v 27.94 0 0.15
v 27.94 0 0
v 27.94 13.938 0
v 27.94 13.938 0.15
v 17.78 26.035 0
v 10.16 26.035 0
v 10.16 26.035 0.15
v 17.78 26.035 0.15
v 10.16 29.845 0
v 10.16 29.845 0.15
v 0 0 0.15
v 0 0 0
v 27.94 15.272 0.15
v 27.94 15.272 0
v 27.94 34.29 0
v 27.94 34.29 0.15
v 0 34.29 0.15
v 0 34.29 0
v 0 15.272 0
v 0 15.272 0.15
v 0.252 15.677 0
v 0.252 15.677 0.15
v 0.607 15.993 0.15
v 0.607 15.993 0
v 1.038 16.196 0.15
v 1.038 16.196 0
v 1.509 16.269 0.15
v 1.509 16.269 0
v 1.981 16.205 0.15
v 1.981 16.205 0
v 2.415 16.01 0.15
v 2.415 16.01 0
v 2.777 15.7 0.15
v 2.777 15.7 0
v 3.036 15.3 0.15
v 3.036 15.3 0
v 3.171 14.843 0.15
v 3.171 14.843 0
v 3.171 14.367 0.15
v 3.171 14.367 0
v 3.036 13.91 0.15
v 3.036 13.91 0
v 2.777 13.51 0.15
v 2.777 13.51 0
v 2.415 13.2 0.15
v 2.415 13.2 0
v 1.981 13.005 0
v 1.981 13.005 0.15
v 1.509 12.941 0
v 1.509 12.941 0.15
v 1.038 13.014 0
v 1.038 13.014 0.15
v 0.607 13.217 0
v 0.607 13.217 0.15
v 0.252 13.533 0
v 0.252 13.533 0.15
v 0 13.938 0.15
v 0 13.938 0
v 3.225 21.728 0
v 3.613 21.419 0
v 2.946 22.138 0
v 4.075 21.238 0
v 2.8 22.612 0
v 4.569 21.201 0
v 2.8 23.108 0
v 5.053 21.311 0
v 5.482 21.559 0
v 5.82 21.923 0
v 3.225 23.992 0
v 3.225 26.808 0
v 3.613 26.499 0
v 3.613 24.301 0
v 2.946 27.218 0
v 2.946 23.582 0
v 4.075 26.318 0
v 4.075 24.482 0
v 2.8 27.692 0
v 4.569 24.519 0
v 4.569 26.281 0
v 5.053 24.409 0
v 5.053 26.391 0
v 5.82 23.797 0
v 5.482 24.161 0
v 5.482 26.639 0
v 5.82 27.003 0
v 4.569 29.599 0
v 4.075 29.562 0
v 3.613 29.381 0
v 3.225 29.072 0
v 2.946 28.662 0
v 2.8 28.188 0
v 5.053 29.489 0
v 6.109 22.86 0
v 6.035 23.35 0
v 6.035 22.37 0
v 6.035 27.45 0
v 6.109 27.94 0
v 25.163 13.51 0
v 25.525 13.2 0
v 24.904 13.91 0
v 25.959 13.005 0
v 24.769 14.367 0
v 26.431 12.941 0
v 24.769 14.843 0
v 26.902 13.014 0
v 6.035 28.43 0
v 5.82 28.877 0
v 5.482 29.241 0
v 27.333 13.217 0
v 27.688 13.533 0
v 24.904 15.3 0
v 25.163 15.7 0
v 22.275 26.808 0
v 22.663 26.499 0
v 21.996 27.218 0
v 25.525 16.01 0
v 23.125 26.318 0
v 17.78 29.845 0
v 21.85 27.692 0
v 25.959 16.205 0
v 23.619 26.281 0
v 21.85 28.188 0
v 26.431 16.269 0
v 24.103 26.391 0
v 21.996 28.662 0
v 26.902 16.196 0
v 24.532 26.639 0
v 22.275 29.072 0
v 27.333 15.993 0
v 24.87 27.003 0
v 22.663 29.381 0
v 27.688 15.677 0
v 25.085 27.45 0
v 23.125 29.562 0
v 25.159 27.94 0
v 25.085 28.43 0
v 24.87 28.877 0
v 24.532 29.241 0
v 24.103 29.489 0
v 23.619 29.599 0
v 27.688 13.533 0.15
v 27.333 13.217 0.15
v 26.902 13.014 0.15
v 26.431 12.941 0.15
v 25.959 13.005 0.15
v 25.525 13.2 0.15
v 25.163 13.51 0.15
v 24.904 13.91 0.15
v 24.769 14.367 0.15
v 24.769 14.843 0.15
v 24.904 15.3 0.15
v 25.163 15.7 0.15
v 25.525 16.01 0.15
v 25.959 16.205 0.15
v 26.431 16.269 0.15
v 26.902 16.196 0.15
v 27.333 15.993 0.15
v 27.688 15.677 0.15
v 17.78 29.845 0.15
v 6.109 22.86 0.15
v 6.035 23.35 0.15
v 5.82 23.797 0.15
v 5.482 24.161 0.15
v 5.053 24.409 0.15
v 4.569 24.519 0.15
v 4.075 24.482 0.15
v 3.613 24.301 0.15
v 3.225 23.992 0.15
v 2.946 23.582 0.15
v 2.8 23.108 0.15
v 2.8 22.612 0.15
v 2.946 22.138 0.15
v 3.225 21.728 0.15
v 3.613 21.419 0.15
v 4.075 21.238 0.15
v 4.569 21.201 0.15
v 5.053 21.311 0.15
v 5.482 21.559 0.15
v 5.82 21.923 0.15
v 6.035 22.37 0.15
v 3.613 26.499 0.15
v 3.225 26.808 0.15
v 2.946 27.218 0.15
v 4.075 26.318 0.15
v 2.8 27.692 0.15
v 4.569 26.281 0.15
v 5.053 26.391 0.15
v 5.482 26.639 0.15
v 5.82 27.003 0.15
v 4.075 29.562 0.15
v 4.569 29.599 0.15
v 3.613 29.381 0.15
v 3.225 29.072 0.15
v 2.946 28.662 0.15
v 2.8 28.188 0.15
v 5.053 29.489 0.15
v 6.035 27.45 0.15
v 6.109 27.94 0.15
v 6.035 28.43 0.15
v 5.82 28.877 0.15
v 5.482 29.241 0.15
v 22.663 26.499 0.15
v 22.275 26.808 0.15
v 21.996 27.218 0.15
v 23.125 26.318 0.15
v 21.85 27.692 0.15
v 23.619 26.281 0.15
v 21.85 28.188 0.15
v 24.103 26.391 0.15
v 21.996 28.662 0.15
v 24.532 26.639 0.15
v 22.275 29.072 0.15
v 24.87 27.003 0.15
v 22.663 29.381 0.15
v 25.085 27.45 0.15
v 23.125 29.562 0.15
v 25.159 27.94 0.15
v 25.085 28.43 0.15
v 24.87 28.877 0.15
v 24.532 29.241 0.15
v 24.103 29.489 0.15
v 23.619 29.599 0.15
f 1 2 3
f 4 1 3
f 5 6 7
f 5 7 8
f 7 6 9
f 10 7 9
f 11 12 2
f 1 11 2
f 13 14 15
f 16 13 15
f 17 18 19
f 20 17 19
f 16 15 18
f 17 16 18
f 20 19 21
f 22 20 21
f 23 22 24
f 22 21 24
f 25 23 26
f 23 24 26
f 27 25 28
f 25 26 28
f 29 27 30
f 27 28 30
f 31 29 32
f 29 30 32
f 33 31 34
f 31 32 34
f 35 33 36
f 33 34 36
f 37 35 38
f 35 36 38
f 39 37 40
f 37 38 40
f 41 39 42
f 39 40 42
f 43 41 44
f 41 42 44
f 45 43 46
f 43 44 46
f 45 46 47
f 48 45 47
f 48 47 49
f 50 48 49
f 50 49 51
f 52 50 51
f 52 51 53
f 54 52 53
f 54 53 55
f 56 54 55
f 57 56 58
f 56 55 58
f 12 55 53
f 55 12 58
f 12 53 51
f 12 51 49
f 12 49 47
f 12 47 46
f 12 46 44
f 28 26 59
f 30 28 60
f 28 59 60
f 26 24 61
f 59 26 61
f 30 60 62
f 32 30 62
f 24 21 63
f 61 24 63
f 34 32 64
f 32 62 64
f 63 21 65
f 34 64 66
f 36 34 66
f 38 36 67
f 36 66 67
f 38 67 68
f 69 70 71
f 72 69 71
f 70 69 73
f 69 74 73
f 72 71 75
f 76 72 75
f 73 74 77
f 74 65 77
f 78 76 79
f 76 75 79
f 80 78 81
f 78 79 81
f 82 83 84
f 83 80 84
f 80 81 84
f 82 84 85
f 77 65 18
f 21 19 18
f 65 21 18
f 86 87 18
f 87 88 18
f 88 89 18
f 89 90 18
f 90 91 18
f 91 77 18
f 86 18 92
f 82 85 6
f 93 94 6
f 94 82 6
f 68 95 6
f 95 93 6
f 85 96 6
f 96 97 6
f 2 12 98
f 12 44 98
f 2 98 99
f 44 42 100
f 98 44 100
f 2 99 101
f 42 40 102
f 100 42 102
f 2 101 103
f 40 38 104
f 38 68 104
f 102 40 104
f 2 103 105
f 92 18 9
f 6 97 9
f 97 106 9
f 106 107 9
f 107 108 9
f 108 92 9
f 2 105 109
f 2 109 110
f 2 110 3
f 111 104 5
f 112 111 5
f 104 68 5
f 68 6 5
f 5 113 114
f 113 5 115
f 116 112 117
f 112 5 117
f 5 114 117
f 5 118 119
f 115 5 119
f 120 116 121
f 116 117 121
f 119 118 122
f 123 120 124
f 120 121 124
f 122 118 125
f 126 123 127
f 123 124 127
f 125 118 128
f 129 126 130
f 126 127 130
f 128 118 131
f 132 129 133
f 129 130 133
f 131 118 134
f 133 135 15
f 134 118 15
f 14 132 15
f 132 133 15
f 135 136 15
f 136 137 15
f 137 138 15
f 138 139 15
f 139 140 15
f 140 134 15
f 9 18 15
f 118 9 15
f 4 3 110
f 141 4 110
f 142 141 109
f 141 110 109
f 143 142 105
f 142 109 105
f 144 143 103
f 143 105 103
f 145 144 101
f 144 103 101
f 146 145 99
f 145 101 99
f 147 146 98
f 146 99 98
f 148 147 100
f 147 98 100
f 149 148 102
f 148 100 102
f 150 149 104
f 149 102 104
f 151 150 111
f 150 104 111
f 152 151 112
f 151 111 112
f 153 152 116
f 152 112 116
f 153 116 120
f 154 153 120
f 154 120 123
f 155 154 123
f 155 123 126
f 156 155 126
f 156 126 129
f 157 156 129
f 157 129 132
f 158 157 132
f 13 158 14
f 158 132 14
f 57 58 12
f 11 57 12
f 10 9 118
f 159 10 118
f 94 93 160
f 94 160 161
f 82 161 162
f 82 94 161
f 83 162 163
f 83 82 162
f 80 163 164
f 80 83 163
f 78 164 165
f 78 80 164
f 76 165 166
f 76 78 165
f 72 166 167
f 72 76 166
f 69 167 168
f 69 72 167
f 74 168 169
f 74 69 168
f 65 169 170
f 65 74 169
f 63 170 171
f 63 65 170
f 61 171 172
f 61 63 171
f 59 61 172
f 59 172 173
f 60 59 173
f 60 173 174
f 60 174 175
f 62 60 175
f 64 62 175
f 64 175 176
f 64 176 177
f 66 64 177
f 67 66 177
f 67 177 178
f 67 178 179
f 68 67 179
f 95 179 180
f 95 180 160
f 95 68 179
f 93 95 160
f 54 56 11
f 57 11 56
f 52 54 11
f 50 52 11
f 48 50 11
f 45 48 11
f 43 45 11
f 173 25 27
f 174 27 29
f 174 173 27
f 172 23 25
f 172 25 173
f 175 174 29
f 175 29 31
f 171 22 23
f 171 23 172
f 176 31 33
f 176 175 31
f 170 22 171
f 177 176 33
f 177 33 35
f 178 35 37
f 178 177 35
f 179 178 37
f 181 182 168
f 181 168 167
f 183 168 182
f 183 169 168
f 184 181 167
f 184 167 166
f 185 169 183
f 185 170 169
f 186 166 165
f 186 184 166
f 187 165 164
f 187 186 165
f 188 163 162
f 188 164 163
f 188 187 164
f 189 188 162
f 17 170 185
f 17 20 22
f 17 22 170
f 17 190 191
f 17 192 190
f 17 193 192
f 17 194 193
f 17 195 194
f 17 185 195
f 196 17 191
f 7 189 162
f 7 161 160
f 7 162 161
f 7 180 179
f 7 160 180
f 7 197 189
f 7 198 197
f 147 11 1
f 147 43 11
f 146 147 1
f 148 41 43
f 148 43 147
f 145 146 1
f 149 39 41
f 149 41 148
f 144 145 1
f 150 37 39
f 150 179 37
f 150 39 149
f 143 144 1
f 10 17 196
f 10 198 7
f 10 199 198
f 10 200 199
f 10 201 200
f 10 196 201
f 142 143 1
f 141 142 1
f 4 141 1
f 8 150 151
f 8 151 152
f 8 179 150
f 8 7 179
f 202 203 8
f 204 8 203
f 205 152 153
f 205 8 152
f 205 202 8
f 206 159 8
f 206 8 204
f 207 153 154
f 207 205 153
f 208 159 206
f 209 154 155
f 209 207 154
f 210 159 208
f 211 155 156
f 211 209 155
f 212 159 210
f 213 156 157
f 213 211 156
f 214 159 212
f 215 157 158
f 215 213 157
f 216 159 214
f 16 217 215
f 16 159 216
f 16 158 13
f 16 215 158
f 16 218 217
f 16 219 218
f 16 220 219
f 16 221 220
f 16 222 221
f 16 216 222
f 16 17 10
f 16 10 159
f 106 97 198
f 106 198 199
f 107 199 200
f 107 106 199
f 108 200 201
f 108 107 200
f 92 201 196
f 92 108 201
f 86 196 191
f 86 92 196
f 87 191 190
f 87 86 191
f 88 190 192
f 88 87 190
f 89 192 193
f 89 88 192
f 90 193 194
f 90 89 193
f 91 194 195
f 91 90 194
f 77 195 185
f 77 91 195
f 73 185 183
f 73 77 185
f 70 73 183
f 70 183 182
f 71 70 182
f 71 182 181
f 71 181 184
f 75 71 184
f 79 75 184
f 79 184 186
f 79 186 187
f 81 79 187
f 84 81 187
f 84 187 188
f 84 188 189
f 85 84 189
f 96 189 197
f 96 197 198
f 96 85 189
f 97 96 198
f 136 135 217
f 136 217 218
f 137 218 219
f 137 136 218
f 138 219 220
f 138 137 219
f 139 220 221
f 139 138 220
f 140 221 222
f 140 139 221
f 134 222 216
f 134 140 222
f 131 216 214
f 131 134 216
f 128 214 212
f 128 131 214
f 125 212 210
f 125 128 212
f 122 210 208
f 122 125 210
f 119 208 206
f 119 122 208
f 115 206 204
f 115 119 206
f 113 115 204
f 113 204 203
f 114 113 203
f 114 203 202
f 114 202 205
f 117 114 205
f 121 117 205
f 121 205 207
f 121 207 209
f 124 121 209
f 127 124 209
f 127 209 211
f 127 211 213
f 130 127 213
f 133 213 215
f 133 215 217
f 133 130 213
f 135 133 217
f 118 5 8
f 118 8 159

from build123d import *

# Parameters (mm, degrees)
SKETCH2_R           = 1.6637
SKETCH2_W           = 7.62
SKETCH2_H           = 3.81
BOSS_EXTRUDE1_DEPTH = 0.15


with BuildPart() as part:
    # Sketch2 → Boss-Extrude1 (new body)
    with BuildSketch(Plane.XY):
        with BuildLine():
            Line((0, 0), (27.94, 0))
            Line((27.94, 0), (27.94, 13.937675724))
            ThreePointArc((27.94, 13.937675724), (24.7523, 14.605), (27.94, 15.272324276))
            Line((27.94, 15.272324276), (27.94, 34.29))
            Line((27.94, 34.29), (0, 34.29))
            Line((0, 34.29), (0, 15.272324276))
            ThreePointArc((0, 15.272324276), (3.1877, 14.605), (0, 13.937675724))
            Line((0, 13.937675724), (0, 0))
        make_face()
        with Locations((4.445, 22.86)):
            Circle(SKETCH2_R, mode=Mode.SUBTRACT)
        with Locations((4.445, 27.94)):
            Circle(SKETCH2_R, mode=Mode.SUBTRACT)
        with Locations((23.495, 27.94)):
            Circle(SKETCH2_R, mode=Mode.SUBTRACT)
        with Locations((13.97, 27.94)):
            Rectangle(SKETCH2_W, SKETCH2_H, mode=Mode.SUBTRACT)
    extrude(amount=BOSS_EXTRUDE1_DEPTH)


solid = part.part
